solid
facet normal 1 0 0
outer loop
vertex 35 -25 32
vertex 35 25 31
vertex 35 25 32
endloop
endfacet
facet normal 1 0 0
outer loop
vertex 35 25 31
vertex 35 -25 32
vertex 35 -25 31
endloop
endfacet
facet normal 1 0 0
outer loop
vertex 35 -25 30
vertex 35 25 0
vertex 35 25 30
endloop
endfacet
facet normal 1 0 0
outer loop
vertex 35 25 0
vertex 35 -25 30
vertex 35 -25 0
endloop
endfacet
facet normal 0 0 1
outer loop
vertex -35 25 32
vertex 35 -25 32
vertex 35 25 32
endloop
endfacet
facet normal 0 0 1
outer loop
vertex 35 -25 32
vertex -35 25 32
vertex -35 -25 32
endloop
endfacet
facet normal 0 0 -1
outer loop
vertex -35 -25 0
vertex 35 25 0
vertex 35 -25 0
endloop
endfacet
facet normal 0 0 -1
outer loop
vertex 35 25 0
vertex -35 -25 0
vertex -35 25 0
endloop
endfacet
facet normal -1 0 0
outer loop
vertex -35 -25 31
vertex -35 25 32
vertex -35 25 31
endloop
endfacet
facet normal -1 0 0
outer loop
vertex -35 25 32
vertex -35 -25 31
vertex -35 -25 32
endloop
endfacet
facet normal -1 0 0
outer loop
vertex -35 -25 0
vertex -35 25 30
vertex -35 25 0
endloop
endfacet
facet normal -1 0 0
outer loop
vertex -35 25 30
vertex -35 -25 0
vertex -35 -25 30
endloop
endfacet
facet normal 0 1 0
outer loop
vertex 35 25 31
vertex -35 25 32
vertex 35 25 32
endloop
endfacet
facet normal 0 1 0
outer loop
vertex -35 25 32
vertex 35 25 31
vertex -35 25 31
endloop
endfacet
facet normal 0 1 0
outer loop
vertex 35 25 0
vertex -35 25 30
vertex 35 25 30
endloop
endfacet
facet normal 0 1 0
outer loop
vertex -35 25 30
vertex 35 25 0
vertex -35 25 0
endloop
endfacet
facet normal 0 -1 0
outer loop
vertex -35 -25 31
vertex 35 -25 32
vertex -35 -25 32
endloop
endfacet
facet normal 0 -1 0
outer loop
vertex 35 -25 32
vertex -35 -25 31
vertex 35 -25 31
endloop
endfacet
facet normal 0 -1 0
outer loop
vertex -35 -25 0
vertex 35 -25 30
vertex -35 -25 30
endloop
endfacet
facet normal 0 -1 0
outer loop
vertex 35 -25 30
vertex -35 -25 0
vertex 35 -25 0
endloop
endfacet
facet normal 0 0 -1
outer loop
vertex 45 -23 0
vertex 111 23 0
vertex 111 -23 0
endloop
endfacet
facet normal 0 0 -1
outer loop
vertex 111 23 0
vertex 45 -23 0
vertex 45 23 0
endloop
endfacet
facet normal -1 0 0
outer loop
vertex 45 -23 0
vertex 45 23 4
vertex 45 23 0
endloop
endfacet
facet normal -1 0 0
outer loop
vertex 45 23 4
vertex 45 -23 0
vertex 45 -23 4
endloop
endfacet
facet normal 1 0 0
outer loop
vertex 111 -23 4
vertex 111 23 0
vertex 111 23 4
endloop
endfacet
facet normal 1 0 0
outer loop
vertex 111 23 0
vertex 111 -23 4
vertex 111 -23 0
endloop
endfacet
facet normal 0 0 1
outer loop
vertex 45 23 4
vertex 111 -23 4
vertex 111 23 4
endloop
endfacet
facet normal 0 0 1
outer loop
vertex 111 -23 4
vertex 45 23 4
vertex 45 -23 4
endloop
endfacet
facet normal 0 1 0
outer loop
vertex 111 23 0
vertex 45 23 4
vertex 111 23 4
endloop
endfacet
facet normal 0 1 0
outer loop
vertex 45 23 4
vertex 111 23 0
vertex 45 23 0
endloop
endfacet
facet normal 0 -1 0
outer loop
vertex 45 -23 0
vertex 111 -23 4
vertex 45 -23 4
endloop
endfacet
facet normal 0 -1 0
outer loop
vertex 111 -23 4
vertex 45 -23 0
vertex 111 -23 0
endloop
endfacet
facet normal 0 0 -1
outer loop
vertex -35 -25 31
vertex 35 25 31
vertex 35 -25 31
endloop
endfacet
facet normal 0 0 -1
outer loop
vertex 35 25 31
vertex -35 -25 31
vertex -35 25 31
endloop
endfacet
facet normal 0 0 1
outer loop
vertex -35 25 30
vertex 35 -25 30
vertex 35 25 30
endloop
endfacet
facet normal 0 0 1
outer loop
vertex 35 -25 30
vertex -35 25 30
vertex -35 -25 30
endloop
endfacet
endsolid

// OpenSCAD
// Two-part enclosure for small electronics board
// Print orientation: box standing on bed, lid upside down on +X side

// ---- Box ----
box_x = 70;      // outer length (X)
box_y = 50;      // outer width (Y)
box_z = 30;      // outer height (Z)
box_w = 2;       // wall thickness
box_f = 2;       // floor thickness

// ---- Lid ----
lip_t = 1.5;     // lip wall thickness
lip_h = 4;       // lip height
lip_x = 65.6;    // lip outer length (X)
lip_y = 45.6;    // lip outer width (Y)
eps   = 0.2;     // clearance between lip and box opening

// ---- Layout ----
gap = 10;        // gap between parts on bed

$fn = 64;

// Lip overcut past the open faces
overcut = [eps, eps, 0];

difference() {
    union() {
        // Box
        translate([-box_x/2, -box_y/2, 0])
            cube([box_x, box_y, box_z + box_f]);

        // Lid (upside down)
        translate([box_x/2 + gap, -lip_y/2, 0])
            cube([lip_x, lip_y, lip_t]);

        // Lip
        translate([box_x/2 + gap, -lip_y/2 - overcut[1], 0])
            cube([lip_x + 2*overcut[0], lip_y + 2*overcut[1], lip_h + overcut[2]]);
    }

    // Cut the box open at the top
    translate([-box_x/2, -box_y/2, box_z])
        cube([box_x, box_y, 1]);
}
